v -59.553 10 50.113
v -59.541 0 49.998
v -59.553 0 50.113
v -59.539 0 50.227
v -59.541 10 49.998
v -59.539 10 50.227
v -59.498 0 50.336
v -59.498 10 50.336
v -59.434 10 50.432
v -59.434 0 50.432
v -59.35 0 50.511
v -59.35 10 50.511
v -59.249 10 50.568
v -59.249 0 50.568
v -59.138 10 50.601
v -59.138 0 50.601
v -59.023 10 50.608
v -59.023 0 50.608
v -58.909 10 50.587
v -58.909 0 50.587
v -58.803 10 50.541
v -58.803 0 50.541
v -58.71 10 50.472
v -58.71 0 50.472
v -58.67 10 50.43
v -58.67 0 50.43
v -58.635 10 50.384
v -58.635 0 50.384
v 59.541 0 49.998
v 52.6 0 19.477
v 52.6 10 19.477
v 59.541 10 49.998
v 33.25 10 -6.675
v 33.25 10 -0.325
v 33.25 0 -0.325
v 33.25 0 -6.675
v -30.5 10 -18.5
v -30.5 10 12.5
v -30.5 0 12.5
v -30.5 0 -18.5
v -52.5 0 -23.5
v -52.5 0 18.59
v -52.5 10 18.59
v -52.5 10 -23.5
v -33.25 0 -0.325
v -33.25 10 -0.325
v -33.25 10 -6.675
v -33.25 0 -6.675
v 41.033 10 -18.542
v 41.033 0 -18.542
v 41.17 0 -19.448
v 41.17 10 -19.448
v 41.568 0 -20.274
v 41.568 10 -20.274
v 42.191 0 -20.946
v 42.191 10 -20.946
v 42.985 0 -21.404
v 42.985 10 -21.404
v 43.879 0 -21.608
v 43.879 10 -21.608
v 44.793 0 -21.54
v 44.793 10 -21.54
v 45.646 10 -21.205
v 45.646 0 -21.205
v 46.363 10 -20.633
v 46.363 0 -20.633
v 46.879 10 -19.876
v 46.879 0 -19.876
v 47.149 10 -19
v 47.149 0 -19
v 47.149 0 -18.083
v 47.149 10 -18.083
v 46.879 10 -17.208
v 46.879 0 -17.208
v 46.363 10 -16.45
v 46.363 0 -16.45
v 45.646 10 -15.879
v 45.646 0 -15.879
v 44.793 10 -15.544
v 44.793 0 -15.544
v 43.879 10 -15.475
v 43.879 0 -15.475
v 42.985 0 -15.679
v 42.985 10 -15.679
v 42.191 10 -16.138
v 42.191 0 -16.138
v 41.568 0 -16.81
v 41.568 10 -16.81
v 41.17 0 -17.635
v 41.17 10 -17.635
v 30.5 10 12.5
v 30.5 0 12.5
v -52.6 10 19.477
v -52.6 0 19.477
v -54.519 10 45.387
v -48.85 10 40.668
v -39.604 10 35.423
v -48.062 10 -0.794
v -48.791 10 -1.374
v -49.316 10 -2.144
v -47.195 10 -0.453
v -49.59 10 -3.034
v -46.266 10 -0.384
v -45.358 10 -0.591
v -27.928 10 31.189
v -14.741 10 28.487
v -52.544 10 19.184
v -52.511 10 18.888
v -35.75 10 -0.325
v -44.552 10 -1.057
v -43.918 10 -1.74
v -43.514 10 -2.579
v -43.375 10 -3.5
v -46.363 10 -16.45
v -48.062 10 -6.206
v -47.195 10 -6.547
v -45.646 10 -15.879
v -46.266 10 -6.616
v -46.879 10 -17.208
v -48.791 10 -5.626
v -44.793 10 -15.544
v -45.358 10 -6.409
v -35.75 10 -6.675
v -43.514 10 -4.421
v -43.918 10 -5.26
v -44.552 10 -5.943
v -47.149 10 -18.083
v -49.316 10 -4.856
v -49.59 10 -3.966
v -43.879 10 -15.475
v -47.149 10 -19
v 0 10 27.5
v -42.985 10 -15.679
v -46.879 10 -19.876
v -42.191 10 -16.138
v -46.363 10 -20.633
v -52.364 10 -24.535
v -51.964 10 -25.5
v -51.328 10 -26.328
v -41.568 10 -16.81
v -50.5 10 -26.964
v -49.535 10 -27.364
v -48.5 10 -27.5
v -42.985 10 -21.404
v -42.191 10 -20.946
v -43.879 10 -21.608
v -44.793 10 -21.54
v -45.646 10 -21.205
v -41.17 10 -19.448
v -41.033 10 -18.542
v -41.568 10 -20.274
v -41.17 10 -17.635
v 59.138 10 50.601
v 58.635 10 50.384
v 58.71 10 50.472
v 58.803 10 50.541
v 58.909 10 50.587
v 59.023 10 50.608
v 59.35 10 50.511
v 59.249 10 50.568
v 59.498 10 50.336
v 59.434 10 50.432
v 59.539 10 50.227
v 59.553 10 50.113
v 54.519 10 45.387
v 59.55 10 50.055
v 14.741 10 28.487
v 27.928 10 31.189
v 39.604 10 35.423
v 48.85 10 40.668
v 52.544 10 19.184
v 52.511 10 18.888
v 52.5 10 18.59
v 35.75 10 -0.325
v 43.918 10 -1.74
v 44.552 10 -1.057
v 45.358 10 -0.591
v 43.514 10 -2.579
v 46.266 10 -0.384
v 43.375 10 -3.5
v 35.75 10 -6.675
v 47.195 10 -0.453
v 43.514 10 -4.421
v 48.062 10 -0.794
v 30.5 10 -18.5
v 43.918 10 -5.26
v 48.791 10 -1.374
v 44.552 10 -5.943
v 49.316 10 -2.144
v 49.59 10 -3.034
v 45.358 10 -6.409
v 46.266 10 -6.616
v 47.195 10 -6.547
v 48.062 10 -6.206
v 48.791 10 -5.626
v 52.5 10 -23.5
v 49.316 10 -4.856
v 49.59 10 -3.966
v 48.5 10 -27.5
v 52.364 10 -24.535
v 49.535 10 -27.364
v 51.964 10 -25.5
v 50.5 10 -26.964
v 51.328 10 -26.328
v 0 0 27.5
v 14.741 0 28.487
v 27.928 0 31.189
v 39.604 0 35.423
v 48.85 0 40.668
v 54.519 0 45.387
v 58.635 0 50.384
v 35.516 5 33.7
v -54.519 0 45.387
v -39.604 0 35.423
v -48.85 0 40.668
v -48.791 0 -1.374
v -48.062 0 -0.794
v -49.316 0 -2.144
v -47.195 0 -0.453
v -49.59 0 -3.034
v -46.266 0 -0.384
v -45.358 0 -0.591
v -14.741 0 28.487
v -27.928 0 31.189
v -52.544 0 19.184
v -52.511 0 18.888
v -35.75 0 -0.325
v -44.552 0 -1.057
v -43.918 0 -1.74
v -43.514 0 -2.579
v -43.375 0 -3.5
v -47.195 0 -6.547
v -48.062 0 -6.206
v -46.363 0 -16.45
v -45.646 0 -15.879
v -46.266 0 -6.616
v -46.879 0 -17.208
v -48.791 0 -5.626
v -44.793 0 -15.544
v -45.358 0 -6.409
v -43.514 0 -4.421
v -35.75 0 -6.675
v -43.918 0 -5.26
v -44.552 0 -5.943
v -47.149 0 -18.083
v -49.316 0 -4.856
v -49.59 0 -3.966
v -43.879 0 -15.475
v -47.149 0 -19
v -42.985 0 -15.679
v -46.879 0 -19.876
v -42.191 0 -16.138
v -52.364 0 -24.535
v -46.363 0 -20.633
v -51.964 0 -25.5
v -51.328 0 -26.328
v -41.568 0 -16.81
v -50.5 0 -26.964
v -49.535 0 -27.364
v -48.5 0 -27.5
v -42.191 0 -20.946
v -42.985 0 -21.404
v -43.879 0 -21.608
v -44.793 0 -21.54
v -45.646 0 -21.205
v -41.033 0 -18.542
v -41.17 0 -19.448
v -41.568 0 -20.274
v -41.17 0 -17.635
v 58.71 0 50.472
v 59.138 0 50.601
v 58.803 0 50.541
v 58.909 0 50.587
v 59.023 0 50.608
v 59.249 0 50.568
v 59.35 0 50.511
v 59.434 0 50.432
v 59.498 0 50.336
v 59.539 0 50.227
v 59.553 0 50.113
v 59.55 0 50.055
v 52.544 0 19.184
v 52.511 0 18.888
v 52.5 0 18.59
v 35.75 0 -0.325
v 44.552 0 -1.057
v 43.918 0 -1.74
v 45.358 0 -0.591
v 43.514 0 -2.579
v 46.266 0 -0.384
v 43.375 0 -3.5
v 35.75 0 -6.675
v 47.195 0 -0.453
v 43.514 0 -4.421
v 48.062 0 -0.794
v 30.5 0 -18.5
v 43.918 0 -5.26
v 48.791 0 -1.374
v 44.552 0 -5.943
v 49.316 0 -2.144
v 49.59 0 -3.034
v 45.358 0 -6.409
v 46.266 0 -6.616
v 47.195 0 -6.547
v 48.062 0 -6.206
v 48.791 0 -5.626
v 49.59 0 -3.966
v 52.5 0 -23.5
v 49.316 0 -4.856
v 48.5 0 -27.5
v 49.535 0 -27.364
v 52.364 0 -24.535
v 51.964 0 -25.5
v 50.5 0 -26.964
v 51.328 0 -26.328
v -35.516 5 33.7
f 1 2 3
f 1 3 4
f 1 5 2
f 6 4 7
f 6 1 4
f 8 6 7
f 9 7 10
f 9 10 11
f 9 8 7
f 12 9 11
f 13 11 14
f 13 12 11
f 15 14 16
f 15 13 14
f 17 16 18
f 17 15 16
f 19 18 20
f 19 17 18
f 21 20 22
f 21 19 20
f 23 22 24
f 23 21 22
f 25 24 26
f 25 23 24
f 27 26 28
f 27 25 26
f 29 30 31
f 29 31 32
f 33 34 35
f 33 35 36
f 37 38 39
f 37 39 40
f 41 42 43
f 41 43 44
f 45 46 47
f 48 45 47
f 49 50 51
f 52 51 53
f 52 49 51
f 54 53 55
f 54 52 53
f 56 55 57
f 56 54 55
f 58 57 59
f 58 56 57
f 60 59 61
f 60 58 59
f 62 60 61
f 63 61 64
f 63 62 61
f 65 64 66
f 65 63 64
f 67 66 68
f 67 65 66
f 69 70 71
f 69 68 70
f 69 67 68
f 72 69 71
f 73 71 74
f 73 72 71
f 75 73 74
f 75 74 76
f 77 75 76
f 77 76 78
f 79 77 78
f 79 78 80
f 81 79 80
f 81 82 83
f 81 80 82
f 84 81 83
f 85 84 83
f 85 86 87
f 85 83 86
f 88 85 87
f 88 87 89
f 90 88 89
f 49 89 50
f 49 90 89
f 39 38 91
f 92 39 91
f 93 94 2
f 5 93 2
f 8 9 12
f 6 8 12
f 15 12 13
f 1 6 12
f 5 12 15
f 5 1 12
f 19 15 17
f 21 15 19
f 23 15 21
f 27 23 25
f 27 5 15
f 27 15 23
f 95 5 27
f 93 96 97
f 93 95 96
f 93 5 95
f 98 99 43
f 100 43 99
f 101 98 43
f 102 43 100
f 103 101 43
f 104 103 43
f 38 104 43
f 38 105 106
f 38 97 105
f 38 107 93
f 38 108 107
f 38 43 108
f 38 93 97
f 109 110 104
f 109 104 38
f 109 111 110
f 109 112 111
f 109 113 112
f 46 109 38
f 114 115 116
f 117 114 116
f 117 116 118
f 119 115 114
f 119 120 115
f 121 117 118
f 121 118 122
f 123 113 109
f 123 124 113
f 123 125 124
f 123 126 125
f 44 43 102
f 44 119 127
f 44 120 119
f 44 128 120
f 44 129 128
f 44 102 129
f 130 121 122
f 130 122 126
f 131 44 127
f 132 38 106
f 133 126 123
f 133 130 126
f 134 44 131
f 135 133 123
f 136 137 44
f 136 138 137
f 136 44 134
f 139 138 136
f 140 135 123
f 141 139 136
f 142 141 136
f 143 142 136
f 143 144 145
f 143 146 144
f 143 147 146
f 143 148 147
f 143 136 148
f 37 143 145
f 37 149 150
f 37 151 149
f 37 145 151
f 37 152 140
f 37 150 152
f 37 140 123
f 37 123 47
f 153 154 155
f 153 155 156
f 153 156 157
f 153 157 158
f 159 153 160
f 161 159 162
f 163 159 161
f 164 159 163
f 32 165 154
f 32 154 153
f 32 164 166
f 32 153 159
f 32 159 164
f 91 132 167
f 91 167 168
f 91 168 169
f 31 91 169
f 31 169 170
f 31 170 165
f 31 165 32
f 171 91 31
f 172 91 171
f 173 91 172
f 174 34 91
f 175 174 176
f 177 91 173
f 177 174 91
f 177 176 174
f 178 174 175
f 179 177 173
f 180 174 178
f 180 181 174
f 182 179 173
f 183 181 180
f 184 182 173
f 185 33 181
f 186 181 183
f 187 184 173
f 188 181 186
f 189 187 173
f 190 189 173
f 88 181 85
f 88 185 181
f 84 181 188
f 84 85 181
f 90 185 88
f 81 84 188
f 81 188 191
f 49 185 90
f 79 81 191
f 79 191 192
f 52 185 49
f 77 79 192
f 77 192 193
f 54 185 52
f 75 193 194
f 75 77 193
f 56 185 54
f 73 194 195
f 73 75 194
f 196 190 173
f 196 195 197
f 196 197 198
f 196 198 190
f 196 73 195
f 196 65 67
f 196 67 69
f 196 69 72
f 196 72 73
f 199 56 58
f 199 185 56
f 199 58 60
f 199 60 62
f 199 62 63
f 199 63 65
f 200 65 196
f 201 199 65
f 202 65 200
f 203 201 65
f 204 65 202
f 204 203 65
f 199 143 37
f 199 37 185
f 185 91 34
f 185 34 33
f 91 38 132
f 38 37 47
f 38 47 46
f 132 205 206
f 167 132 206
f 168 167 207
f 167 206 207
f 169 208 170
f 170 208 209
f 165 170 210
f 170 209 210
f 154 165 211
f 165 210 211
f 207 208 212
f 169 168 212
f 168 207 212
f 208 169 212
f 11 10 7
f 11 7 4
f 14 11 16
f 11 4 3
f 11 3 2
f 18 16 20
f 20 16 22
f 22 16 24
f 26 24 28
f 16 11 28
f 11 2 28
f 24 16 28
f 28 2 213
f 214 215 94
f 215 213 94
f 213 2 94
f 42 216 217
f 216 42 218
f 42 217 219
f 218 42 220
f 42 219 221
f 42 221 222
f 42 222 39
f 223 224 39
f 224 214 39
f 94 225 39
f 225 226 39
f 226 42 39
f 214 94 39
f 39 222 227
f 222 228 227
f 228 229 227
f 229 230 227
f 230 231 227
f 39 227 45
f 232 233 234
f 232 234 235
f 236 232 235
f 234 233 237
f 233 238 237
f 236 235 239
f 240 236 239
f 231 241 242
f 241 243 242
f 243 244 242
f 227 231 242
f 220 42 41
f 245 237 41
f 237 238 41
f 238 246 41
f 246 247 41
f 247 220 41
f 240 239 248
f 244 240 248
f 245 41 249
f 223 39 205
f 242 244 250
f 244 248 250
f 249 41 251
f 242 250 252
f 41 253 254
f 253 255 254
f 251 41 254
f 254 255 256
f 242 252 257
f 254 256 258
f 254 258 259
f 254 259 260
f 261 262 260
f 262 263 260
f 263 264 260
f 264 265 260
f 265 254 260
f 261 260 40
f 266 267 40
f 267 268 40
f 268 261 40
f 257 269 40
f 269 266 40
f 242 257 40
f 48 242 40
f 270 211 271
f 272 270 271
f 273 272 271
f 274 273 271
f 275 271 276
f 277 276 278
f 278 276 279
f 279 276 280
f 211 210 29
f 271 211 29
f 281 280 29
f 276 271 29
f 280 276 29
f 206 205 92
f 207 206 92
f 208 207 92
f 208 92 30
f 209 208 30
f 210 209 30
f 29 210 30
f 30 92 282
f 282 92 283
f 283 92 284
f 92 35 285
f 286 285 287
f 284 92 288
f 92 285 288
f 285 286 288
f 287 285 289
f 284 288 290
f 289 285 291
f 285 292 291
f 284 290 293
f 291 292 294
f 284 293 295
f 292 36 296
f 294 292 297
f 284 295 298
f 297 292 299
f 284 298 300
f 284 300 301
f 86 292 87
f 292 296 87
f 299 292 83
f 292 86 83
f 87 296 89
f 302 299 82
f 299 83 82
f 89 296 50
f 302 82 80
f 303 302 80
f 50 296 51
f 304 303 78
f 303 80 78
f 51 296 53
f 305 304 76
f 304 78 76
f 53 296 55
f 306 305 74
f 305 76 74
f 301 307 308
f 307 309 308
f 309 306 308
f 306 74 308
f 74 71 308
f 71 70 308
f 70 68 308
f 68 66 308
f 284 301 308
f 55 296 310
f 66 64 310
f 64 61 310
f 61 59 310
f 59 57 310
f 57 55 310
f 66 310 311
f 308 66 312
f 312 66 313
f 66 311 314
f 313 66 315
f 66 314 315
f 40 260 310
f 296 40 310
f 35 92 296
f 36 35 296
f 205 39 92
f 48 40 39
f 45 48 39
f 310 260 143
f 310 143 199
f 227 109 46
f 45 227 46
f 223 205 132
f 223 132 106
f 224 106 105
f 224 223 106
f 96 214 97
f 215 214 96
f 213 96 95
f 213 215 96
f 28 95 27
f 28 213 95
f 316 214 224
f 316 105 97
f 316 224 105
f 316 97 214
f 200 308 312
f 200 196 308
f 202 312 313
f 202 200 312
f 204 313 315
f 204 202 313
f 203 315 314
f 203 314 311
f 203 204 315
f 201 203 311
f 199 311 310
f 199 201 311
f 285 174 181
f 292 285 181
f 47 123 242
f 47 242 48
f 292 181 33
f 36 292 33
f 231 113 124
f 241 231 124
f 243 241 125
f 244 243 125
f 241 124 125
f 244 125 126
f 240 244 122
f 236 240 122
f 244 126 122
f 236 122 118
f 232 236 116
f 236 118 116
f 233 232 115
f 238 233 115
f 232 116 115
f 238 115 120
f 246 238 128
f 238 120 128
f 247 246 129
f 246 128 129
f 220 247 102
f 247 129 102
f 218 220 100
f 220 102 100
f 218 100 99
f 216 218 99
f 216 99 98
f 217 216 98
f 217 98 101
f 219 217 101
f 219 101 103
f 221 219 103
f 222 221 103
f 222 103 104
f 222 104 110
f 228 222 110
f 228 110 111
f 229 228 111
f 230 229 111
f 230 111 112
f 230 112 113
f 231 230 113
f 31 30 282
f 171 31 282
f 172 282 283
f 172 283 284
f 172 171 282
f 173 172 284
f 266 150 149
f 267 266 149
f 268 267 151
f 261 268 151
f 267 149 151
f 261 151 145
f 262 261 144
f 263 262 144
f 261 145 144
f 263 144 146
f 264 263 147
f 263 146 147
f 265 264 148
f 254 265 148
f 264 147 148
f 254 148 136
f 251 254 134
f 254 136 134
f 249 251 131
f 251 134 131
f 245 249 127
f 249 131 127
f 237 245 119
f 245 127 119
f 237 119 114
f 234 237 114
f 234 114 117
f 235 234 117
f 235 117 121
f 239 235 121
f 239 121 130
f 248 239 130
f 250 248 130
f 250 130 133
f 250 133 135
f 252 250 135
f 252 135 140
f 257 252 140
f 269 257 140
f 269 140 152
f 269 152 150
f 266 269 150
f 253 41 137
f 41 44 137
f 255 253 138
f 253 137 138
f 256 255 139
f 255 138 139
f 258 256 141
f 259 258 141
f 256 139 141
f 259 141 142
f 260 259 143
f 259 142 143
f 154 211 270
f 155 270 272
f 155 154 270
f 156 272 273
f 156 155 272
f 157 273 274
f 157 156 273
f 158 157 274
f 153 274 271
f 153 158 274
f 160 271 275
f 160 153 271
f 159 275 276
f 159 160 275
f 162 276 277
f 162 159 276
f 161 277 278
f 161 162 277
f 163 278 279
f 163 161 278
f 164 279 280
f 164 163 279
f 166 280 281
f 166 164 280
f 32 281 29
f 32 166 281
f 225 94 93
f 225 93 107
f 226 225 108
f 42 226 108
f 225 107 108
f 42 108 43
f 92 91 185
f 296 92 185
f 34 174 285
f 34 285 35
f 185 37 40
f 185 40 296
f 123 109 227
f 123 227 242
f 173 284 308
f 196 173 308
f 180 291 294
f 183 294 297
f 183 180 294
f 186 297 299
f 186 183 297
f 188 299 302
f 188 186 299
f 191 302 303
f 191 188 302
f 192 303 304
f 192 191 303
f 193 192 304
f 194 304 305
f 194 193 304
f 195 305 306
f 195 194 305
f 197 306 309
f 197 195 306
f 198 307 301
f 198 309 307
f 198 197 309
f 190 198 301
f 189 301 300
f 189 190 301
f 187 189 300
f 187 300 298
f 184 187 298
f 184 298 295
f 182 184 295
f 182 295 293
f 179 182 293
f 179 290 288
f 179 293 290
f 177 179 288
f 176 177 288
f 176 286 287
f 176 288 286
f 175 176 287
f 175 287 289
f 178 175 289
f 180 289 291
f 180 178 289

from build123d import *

# Parameters (mm, degrees)
SKETCH1_W           = 105
SKETCH1_H           = 55
BOSS_EXTRUDE1_DEPTH = 10
SKETCH2_W           = 61
SKETCH2_H           = 31
CUT_EXTRUDE1_DEPTH  = 11
SKETCH4_R           = 3.125
SKETCH4_W           = 2.5
SKETCH4_H           = 6.35
CUT_EXTRUDE3_DEPTH  = 11
BOSS_EXTRUDE2_DEPTH = 10
SKETCH6_R           = 3.075
CUT_EXTRUDE4_DEPTH  = 11.0000001
FILLET1_R           = 4
FILLET2_R           = 0.5


with BuildPart() as part:
    # Sketch1 → Boss-Extrude1 (new body)
    with BuildSketch(Plane(origin=(0, 0, 0), x_dir=(1, 0, 0), z_dir=(0, 1, 0))):
        Rectangle(SKETCH1_W, SKETCH1_H)
    extrude(amount=BOSS_EXTRUDE1_DEPTH)

    # Sketch2 → Cut-Extrude1 (cut, through all)
    with BuildSketch(Plane(origin=(0, 10, 0), x_dir=(1, 0, 0), z_dir=(0, 1, 0))):
        with Locations((0, 3)):
            Rectangle(SKETCH2_W, SKETCH2_H)
    extrude(amount=-CUT_EXTRUDE1_DEPTH, mode=Mode.SUBTRACT)

    # Sketch4 → Cut-Extrude3 (cut, through all)
    with BuildSketch(Plane(origin=(0, 10, 0), x_dir=(1, 0, 0), z_dir=(0, 1, 0))):
        with Locations((-46.5, 3.5)):
            Circle(SKETCH4_R)
        with Locations((-34.5, 3.5)):
            Rectangle(SKETCH4_W, SKETCH4_H)
    cut_extrude3 = extrude(amount=-CUT_EXTRUDE3_DEPTH, mode=Mode.SUBTRACT)

    # Sketch5 → Boss-Extrude2 (add)
    with BuildSketch(Plane(origin=(0, 0, 0), x_dir=(1, 0, 0), z_dir=(0, 1, 0))):
        with BuildLine():
            Line((0, -27.5), (-52.5, -19.039128985))
            Line((-52.5, -19.039128985), (-60.28224578, -53.259137237))
            add(Edge.make_bspline(
                [(0, -27.5), (-47.690720084, -27.5), (-60.28224578, -53.259137237)],
                knots=[4.71238898, 4.71238898, 4.71238898, 6.015992757, 6.015992757, 6.015992757], degree=2, weights=[1, 0.794992028, 1]))
        make_face()
    boss_extrude2 = extrude(amount=BOSS_EXTRUDE2_DEPTH)

    # Sketch6 → Cut-Extrude4 (cut, through all)
    with BuildSketch(Plane(origin=(0, 10, 0), x_dir=(1, 0, 0), z_dir=(0, 1, 0))):
        with Locations((-44.108495475, 18.541732167)):
            Circle(SKETCH6_R)
    cut_extrude4 = extrude(amount=-CUT_EXTRUDE4_DEPTH, mode=Mode.SUBTRACT)

    # Mirror1: Cut-Extrude3, Boss-Extrude2, Cut-Extrude4 across plane
    add(cut_extrude3.mirror(Plane(origin=(0, 0, 0), x_dir=(0, 0, 1), z_dir=(1, 0, 0))), mode=Mode.SUBTRACT)
    add(boss_extrude2.mirror(Plane(origin=(0, 0, 0), x_dir=(0, 0, 1), z_dir=(1, 0, 0))))
    add(cut_extrude4.mirror(Plane(origin=(0, 0, 0), x_dir=(0, 0, 1), z_dir=(1, 0, 0))), mode=Mode.SUBTRACT)

    # Fillet1
    fillet1_edges = [part.edges().sort_by_distance(p)[0] for p in [
        (-52.5, 5, 19.039128985),
        (-52.5, 5, -27.5),
        (52.5, 5, -27.5),
        (52.5, 5, 19.039128985),
    ]]
    fillet(fillet1_edges, radius=FILLET1_R)

    # Fillet2
    fillet2_edges = [part.edges().sort_by_distance(p)[0] for p in [
        (60.28224578, 5, 53.259137237),
        (-60.28224578, 5, 53.259137237),
    ]]
    fillet(fillet2_edges, radius=FILLET2_R)


solid = part.part
